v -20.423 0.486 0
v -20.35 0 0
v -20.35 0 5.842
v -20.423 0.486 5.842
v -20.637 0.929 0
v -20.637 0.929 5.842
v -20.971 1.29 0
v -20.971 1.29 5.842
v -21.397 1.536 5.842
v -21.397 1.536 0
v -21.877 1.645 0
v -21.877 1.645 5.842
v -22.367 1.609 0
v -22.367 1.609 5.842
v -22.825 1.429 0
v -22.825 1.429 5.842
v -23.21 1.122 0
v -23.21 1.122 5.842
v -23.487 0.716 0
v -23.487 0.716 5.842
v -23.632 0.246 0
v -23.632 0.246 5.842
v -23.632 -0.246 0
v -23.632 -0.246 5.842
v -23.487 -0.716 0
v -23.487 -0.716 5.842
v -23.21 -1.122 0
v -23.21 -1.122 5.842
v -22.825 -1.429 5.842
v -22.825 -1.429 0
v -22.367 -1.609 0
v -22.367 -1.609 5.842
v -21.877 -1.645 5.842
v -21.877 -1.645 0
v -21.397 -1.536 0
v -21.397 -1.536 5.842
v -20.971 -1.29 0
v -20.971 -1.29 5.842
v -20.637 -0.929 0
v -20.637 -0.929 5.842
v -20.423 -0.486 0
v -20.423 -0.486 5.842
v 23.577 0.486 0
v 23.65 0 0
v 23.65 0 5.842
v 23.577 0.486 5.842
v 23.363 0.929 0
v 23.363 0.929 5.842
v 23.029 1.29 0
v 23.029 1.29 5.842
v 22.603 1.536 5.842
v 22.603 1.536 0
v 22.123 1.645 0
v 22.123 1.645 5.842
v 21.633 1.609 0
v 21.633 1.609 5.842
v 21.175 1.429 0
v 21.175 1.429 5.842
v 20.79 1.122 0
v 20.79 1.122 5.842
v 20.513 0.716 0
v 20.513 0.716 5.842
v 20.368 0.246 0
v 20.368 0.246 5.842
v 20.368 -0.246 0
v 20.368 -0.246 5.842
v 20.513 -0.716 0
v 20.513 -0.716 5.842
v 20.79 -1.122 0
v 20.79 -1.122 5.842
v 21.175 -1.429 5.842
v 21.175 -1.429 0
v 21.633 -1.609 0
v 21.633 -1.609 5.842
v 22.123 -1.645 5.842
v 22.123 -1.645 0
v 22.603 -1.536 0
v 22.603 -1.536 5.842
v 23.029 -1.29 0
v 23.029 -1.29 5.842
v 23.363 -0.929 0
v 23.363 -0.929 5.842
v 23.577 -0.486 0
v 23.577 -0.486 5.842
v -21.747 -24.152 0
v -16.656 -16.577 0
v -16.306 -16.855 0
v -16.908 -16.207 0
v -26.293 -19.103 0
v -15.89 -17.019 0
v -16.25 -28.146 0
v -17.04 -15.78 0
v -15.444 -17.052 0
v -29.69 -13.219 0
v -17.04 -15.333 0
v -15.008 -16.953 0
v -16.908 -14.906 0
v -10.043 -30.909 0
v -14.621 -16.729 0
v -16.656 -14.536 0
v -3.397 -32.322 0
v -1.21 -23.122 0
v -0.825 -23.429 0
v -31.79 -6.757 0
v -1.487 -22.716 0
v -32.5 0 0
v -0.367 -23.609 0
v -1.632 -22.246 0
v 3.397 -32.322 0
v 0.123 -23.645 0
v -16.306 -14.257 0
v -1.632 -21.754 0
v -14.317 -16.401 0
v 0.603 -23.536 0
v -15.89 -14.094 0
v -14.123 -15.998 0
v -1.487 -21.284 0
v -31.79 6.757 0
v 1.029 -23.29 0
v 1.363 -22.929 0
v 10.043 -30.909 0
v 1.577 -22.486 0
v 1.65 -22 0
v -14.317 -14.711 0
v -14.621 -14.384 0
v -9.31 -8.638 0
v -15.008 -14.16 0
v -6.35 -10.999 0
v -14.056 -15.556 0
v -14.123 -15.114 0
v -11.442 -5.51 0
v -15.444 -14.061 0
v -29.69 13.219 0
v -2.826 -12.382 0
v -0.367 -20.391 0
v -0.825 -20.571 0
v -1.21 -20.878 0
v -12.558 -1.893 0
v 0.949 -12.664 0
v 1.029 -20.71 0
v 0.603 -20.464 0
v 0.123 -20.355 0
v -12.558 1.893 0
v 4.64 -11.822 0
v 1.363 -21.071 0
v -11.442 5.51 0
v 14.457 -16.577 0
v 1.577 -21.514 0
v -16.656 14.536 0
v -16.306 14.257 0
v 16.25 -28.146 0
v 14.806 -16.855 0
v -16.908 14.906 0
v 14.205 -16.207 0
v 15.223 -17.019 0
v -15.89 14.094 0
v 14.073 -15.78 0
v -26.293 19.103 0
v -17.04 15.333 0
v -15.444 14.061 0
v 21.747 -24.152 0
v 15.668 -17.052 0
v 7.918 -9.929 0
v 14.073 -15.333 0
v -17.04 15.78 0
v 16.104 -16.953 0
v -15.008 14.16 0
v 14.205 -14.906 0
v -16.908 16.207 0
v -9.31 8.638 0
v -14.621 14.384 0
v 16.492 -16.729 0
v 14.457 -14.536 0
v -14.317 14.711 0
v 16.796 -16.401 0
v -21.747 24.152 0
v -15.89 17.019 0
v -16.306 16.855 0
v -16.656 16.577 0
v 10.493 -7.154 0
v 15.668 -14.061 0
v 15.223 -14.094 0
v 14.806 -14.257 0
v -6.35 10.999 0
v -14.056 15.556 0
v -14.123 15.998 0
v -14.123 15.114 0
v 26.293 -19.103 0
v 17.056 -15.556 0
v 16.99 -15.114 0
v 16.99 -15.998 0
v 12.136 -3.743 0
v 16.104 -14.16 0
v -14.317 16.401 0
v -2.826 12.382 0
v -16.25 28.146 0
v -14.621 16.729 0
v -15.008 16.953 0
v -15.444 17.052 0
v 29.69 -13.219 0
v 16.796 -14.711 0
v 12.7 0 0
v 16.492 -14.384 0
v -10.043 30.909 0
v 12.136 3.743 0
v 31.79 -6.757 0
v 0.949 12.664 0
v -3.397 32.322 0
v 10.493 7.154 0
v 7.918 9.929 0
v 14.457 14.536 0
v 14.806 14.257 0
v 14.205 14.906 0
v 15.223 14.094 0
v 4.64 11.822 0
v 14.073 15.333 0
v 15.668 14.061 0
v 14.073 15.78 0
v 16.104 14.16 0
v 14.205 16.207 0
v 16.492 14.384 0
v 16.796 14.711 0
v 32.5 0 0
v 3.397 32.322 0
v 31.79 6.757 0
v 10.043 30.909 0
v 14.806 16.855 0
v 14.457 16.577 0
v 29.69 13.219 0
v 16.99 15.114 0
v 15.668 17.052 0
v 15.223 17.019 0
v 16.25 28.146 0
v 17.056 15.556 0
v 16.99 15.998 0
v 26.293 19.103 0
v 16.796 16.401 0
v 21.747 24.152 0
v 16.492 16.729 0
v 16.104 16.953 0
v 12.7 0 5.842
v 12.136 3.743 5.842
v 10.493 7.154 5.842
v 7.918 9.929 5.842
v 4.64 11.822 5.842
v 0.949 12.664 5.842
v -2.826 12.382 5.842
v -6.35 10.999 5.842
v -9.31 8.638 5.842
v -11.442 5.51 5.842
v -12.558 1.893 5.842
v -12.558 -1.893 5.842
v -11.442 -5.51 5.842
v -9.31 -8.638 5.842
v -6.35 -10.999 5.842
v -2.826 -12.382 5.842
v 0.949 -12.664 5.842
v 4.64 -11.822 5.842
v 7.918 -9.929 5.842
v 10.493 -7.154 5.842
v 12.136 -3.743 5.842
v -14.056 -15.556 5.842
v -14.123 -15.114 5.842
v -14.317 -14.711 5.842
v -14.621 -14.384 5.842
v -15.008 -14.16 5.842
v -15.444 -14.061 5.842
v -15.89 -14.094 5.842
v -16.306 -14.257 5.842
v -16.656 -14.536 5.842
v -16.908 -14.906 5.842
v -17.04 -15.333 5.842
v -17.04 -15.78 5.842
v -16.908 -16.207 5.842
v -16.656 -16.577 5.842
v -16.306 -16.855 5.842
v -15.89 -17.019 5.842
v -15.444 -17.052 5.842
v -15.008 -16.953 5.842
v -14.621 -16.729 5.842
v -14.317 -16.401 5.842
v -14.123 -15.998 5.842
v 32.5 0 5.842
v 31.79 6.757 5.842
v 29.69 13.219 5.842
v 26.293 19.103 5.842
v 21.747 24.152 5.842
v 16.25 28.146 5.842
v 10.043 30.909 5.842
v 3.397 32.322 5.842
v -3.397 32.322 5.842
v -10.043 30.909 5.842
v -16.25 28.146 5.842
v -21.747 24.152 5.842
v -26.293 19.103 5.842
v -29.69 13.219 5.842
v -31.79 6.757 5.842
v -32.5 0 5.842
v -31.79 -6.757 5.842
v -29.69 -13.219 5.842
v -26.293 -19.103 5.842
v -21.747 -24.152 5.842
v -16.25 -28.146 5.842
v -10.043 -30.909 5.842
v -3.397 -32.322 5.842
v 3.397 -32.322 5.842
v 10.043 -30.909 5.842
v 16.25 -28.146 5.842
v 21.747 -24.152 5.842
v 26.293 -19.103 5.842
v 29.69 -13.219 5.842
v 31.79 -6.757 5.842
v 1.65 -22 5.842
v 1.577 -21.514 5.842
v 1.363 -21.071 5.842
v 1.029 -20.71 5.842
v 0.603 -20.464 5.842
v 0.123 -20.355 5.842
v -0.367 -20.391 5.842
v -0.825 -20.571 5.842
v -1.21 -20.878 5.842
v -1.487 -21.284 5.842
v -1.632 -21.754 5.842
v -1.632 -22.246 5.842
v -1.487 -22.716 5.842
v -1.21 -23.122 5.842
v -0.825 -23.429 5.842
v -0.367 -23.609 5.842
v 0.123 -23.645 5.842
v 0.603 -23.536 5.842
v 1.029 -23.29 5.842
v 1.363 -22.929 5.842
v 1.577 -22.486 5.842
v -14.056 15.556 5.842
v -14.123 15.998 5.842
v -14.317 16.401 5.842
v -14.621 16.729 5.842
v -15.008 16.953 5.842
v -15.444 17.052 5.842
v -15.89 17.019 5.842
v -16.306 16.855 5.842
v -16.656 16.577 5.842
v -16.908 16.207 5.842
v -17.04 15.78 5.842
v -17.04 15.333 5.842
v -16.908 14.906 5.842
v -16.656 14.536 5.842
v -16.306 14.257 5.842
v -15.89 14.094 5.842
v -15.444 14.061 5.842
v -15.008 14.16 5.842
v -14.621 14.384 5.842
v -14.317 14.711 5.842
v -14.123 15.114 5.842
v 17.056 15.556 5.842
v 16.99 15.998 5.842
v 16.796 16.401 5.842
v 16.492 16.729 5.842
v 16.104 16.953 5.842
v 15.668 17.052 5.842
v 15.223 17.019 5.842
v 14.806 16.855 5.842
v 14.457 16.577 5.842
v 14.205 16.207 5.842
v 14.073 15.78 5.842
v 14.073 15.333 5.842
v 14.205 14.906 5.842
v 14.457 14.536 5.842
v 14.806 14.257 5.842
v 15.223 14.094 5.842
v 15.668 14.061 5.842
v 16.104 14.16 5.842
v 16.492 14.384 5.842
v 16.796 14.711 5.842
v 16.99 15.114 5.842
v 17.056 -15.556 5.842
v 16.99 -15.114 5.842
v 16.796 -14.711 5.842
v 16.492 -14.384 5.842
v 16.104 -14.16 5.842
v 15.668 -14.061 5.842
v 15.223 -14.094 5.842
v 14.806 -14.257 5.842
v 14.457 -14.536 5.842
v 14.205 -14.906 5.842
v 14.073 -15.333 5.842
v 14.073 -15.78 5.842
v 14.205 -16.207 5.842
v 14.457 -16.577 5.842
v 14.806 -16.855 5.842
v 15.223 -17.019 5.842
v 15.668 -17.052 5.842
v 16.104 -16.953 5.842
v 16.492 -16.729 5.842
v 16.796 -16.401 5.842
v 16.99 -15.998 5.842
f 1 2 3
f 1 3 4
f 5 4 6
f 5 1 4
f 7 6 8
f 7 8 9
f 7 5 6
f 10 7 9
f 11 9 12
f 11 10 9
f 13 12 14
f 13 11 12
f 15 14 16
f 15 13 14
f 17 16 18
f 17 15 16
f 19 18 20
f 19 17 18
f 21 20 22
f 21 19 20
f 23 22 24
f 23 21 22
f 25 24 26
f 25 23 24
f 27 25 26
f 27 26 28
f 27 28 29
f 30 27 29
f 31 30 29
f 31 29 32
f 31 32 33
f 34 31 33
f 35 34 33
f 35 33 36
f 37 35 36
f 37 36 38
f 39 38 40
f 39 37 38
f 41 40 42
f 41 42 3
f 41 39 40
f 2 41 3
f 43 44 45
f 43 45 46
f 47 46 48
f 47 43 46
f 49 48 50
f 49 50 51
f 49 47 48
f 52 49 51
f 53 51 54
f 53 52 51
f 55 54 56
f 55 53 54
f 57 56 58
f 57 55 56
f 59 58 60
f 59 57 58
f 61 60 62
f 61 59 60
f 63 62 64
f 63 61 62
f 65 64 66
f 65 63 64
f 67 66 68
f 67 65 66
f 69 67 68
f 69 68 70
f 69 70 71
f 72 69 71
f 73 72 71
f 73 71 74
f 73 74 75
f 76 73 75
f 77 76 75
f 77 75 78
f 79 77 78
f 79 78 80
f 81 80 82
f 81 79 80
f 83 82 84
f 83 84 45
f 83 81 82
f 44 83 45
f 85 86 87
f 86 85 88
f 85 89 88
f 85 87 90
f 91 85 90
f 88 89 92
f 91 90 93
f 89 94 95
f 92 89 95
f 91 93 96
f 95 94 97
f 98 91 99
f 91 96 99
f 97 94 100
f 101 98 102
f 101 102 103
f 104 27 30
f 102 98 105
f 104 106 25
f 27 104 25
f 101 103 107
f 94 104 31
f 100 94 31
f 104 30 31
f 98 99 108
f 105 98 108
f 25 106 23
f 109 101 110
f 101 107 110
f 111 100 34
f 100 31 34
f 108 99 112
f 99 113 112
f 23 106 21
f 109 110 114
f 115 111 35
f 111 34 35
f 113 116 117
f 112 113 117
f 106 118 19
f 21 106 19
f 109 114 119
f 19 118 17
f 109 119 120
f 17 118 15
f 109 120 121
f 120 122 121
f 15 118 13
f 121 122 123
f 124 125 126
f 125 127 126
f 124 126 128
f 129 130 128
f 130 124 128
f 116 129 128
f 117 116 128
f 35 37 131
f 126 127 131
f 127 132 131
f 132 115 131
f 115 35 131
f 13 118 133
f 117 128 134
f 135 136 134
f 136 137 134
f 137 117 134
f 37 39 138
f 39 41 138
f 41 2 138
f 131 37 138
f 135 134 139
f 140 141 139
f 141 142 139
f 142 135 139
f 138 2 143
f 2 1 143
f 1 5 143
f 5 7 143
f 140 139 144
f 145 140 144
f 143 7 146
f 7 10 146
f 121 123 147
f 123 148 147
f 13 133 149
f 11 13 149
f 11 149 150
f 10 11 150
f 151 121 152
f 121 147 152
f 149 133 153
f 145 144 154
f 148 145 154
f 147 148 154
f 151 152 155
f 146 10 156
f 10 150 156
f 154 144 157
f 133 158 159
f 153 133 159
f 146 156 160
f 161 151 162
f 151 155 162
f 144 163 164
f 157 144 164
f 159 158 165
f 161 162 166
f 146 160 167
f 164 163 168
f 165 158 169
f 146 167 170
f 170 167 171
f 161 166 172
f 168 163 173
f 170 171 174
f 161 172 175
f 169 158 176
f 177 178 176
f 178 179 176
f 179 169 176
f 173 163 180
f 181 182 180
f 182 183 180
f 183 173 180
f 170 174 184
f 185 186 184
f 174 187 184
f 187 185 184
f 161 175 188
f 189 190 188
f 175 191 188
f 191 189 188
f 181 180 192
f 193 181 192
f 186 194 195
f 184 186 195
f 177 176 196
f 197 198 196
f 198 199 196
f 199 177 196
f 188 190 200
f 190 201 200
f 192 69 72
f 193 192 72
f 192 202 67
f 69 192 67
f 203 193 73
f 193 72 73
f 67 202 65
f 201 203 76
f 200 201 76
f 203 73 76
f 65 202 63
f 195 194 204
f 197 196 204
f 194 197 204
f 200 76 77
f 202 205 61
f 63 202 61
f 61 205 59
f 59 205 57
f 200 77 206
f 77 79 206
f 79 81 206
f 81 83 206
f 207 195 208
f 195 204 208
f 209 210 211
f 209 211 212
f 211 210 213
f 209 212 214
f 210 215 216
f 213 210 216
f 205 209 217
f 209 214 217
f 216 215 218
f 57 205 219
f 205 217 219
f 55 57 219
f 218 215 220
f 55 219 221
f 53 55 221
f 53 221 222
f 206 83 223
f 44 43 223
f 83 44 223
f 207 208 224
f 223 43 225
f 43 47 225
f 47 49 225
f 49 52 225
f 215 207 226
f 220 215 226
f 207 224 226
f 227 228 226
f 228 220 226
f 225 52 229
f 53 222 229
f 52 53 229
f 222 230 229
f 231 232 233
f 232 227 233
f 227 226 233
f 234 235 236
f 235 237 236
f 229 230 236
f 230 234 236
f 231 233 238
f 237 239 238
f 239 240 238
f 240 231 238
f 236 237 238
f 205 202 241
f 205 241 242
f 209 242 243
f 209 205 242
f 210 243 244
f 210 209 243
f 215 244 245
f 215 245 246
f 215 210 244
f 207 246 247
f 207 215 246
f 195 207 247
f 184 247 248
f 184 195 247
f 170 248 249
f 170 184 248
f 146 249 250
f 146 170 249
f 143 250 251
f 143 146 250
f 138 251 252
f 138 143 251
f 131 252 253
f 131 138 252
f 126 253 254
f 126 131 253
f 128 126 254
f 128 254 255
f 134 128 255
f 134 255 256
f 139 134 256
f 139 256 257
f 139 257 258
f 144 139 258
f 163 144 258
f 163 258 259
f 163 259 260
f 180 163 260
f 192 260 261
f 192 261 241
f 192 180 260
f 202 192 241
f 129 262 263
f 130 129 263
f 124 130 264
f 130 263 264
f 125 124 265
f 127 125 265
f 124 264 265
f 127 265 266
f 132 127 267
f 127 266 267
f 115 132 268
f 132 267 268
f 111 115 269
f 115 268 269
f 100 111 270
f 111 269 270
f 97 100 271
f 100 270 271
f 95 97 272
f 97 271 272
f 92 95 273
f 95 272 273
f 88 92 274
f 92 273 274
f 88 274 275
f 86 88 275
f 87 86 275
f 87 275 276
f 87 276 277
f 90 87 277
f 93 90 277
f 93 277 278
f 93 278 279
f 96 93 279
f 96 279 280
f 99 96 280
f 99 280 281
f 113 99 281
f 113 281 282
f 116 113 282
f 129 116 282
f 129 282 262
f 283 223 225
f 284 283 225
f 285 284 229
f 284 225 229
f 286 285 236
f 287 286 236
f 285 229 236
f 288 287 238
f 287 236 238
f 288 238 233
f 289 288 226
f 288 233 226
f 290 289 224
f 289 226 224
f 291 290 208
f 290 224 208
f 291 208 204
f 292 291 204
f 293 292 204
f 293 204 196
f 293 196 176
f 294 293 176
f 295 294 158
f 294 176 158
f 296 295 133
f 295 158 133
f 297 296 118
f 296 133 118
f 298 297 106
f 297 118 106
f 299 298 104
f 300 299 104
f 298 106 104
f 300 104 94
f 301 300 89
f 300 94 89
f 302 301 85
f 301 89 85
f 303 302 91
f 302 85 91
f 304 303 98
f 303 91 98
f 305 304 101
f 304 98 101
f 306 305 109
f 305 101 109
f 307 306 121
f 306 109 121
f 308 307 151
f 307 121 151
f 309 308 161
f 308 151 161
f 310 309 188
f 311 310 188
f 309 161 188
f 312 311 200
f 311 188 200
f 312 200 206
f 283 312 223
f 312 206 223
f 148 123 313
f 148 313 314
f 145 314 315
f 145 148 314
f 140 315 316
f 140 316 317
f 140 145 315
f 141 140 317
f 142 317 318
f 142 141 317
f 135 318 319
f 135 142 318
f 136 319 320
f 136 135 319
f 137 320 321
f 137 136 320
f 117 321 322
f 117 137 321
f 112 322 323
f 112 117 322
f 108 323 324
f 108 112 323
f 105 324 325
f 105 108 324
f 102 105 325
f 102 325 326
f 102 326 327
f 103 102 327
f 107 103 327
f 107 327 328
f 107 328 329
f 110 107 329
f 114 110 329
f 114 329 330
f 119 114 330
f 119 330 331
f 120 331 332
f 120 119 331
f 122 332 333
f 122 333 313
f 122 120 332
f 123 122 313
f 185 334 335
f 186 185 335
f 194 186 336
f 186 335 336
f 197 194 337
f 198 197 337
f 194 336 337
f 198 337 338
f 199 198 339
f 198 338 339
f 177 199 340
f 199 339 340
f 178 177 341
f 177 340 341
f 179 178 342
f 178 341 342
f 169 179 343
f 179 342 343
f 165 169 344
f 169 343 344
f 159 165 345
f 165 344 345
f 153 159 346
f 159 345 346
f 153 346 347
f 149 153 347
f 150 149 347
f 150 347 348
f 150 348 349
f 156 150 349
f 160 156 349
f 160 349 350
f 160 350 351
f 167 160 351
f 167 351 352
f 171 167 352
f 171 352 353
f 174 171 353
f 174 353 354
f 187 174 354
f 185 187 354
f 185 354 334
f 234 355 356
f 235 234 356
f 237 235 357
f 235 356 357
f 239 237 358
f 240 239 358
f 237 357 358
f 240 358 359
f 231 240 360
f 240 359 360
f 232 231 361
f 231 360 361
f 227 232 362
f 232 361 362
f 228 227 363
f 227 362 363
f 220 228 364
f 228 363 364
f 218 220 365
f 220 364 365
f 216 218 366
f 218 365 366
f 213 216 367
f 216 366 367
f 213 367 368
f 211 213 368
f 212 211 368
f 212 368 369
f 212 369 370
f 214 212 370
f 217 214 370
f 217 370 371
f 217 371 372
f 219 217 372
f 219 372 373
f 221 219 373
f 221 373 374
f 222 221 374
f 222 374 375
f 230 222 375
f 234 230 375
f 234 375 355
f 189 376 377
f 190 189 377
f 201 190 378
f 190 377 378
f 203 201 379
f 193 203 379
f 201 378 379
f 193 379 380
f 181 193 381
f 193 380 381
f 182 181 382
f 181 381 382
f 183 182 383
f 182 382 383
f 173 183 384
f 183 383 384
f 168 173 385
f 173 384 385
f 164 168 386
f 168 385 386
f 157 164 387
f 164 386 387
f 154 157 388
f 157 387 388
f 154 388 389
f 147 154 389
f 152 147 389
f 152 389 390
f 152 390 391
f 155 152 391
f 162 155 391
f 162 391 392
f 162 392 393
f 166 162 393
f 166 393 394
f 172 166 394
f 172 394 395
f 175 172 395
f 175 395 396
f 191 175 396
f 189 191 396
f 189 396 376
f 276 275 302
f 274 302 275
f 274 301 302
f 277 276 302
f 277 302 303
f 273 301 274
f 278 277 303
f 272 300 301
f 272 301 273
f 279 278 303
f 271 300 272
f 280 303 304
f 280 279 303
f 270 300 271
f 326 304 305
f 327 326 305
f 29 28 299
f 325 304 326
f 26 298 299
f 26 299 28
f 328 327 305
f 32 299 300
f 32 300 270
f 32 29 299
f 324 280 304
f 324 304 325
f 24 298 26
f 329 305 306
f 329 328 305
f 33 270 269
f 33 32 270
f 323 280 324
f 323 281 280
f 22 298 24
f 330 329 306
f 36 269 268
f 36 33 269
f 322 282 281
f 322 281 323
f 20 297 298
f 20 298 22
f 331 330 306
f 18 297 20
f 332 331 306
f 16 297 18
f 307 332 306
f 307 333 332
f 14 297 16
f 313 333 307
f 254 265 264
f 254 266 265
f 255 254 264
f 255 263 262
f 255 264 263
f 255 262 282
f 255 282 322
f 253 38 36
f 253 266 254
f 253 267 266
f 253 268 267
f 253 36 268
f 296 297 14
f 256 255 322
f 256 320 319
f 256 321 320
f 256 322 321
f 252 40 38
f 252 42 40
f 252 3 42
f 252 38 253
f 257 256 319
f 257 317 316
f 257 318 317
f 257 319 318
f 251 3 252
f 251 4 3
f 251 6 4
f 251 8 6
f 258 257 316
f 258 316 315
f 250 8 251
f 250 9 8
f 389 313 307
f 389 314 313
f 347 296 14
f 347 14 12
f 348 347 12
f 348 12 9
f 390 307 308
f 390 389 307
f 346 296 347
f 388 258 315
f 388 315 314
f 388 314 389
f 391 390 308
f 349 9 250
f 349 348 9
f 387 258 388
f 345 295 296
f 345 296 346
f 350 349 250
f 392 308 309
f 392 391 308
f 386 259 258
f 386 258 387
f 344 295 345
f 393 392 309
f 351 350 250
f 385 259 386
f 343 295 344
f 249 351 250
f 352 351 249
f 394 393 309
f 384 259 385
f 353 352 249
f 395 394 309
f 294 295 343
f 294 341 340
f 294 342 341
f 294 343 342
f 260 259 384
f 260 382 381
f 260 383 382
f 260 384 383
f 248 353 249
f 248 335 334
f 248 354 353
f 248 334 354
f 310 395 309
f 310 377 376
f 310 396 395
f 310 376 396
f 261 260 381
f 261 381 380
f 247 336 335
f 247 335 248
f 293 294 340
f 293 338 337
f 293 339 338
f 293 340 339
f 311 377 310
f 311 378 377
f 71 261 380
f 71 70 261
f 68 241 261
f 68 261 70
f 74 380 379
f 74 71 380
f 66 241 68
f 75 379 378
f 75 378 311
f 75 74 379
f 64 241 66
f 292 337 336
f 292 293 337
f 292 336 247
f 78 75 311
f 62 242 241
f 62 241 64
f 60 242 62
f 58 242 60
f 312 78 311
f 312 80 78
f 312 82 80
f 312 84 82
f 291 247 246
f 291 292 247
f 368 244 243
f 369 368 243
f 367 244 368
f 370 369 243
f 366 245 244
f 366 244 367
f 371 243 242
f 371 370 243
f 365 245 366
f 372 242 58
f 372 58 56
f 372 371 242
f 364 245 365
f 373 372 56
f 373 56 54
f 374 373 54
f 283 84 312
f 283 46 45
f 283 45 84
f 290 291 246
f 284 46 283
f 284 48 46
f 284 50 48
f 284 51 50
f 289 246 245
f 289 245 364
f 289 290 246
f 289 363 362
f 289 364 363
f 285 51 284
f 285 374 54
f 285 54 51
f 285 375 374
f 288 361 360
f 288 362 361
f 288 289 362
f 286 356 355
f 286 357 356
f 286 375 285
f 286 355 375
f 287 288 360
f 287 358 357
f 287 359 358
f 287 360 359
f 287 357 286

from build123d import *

# Parameters (mm, degrees)
SKETCH1_R           = 32.5
SKETCH1_R_2         = 12.7
SKETCH1_R_3         = 1.65
BOSS_EXTRUDE1_DEPTH = 5.842
SKETCH2_R           = 1.5
CUT_EXTRUDE2_DEPTH  = 47.331727401


with BuildPart() as part:
    # Sketch1 → Boss-Extrude1 (new body)
    with BuildSketch(Plane.XY):
        Circle(SKETCH1_R)
        Circle(SKETCH1_R_2, mode=Mode.SUBTRACT)
        with Locations((22, 0)):
            Circle(SKETCH1_R_3, mode=Mode.SUBTRACT)
        with Locations((0, -22)):
            Circle(SKETCH1_R_3, mode=Mode.SUBTRACT)
        with Locations((-22, 0)):
            Circle(SKETCH1_R_3, mode=Mode.SUBTRACT)
    extrude(amount=BOSS_EXTRUDE1_DEPTH)

    # Sketch2 → Cut-Extrude2 (cut, through all)
    with BuildSketch(Plane.XY.offset(5.842)):
        with Locations((-15.556349186, -15.556349186)):
            Circle(SKETCH2_R)
        with Locations((-15.556349186, 15.556349186)):
            Circle(SKETCH2_R)
        with Locations((15.556349186, 15.556349186)):
            Circle(SKETCH2_R)
        with Locations((15.556349186, -15.556349186)):
            Circle(SKETCH2_R)
    extrude(amount=-CUT_EXTRUDE2_DEPTH, mode=Mode.SUBTRACT)


solid = part.part
